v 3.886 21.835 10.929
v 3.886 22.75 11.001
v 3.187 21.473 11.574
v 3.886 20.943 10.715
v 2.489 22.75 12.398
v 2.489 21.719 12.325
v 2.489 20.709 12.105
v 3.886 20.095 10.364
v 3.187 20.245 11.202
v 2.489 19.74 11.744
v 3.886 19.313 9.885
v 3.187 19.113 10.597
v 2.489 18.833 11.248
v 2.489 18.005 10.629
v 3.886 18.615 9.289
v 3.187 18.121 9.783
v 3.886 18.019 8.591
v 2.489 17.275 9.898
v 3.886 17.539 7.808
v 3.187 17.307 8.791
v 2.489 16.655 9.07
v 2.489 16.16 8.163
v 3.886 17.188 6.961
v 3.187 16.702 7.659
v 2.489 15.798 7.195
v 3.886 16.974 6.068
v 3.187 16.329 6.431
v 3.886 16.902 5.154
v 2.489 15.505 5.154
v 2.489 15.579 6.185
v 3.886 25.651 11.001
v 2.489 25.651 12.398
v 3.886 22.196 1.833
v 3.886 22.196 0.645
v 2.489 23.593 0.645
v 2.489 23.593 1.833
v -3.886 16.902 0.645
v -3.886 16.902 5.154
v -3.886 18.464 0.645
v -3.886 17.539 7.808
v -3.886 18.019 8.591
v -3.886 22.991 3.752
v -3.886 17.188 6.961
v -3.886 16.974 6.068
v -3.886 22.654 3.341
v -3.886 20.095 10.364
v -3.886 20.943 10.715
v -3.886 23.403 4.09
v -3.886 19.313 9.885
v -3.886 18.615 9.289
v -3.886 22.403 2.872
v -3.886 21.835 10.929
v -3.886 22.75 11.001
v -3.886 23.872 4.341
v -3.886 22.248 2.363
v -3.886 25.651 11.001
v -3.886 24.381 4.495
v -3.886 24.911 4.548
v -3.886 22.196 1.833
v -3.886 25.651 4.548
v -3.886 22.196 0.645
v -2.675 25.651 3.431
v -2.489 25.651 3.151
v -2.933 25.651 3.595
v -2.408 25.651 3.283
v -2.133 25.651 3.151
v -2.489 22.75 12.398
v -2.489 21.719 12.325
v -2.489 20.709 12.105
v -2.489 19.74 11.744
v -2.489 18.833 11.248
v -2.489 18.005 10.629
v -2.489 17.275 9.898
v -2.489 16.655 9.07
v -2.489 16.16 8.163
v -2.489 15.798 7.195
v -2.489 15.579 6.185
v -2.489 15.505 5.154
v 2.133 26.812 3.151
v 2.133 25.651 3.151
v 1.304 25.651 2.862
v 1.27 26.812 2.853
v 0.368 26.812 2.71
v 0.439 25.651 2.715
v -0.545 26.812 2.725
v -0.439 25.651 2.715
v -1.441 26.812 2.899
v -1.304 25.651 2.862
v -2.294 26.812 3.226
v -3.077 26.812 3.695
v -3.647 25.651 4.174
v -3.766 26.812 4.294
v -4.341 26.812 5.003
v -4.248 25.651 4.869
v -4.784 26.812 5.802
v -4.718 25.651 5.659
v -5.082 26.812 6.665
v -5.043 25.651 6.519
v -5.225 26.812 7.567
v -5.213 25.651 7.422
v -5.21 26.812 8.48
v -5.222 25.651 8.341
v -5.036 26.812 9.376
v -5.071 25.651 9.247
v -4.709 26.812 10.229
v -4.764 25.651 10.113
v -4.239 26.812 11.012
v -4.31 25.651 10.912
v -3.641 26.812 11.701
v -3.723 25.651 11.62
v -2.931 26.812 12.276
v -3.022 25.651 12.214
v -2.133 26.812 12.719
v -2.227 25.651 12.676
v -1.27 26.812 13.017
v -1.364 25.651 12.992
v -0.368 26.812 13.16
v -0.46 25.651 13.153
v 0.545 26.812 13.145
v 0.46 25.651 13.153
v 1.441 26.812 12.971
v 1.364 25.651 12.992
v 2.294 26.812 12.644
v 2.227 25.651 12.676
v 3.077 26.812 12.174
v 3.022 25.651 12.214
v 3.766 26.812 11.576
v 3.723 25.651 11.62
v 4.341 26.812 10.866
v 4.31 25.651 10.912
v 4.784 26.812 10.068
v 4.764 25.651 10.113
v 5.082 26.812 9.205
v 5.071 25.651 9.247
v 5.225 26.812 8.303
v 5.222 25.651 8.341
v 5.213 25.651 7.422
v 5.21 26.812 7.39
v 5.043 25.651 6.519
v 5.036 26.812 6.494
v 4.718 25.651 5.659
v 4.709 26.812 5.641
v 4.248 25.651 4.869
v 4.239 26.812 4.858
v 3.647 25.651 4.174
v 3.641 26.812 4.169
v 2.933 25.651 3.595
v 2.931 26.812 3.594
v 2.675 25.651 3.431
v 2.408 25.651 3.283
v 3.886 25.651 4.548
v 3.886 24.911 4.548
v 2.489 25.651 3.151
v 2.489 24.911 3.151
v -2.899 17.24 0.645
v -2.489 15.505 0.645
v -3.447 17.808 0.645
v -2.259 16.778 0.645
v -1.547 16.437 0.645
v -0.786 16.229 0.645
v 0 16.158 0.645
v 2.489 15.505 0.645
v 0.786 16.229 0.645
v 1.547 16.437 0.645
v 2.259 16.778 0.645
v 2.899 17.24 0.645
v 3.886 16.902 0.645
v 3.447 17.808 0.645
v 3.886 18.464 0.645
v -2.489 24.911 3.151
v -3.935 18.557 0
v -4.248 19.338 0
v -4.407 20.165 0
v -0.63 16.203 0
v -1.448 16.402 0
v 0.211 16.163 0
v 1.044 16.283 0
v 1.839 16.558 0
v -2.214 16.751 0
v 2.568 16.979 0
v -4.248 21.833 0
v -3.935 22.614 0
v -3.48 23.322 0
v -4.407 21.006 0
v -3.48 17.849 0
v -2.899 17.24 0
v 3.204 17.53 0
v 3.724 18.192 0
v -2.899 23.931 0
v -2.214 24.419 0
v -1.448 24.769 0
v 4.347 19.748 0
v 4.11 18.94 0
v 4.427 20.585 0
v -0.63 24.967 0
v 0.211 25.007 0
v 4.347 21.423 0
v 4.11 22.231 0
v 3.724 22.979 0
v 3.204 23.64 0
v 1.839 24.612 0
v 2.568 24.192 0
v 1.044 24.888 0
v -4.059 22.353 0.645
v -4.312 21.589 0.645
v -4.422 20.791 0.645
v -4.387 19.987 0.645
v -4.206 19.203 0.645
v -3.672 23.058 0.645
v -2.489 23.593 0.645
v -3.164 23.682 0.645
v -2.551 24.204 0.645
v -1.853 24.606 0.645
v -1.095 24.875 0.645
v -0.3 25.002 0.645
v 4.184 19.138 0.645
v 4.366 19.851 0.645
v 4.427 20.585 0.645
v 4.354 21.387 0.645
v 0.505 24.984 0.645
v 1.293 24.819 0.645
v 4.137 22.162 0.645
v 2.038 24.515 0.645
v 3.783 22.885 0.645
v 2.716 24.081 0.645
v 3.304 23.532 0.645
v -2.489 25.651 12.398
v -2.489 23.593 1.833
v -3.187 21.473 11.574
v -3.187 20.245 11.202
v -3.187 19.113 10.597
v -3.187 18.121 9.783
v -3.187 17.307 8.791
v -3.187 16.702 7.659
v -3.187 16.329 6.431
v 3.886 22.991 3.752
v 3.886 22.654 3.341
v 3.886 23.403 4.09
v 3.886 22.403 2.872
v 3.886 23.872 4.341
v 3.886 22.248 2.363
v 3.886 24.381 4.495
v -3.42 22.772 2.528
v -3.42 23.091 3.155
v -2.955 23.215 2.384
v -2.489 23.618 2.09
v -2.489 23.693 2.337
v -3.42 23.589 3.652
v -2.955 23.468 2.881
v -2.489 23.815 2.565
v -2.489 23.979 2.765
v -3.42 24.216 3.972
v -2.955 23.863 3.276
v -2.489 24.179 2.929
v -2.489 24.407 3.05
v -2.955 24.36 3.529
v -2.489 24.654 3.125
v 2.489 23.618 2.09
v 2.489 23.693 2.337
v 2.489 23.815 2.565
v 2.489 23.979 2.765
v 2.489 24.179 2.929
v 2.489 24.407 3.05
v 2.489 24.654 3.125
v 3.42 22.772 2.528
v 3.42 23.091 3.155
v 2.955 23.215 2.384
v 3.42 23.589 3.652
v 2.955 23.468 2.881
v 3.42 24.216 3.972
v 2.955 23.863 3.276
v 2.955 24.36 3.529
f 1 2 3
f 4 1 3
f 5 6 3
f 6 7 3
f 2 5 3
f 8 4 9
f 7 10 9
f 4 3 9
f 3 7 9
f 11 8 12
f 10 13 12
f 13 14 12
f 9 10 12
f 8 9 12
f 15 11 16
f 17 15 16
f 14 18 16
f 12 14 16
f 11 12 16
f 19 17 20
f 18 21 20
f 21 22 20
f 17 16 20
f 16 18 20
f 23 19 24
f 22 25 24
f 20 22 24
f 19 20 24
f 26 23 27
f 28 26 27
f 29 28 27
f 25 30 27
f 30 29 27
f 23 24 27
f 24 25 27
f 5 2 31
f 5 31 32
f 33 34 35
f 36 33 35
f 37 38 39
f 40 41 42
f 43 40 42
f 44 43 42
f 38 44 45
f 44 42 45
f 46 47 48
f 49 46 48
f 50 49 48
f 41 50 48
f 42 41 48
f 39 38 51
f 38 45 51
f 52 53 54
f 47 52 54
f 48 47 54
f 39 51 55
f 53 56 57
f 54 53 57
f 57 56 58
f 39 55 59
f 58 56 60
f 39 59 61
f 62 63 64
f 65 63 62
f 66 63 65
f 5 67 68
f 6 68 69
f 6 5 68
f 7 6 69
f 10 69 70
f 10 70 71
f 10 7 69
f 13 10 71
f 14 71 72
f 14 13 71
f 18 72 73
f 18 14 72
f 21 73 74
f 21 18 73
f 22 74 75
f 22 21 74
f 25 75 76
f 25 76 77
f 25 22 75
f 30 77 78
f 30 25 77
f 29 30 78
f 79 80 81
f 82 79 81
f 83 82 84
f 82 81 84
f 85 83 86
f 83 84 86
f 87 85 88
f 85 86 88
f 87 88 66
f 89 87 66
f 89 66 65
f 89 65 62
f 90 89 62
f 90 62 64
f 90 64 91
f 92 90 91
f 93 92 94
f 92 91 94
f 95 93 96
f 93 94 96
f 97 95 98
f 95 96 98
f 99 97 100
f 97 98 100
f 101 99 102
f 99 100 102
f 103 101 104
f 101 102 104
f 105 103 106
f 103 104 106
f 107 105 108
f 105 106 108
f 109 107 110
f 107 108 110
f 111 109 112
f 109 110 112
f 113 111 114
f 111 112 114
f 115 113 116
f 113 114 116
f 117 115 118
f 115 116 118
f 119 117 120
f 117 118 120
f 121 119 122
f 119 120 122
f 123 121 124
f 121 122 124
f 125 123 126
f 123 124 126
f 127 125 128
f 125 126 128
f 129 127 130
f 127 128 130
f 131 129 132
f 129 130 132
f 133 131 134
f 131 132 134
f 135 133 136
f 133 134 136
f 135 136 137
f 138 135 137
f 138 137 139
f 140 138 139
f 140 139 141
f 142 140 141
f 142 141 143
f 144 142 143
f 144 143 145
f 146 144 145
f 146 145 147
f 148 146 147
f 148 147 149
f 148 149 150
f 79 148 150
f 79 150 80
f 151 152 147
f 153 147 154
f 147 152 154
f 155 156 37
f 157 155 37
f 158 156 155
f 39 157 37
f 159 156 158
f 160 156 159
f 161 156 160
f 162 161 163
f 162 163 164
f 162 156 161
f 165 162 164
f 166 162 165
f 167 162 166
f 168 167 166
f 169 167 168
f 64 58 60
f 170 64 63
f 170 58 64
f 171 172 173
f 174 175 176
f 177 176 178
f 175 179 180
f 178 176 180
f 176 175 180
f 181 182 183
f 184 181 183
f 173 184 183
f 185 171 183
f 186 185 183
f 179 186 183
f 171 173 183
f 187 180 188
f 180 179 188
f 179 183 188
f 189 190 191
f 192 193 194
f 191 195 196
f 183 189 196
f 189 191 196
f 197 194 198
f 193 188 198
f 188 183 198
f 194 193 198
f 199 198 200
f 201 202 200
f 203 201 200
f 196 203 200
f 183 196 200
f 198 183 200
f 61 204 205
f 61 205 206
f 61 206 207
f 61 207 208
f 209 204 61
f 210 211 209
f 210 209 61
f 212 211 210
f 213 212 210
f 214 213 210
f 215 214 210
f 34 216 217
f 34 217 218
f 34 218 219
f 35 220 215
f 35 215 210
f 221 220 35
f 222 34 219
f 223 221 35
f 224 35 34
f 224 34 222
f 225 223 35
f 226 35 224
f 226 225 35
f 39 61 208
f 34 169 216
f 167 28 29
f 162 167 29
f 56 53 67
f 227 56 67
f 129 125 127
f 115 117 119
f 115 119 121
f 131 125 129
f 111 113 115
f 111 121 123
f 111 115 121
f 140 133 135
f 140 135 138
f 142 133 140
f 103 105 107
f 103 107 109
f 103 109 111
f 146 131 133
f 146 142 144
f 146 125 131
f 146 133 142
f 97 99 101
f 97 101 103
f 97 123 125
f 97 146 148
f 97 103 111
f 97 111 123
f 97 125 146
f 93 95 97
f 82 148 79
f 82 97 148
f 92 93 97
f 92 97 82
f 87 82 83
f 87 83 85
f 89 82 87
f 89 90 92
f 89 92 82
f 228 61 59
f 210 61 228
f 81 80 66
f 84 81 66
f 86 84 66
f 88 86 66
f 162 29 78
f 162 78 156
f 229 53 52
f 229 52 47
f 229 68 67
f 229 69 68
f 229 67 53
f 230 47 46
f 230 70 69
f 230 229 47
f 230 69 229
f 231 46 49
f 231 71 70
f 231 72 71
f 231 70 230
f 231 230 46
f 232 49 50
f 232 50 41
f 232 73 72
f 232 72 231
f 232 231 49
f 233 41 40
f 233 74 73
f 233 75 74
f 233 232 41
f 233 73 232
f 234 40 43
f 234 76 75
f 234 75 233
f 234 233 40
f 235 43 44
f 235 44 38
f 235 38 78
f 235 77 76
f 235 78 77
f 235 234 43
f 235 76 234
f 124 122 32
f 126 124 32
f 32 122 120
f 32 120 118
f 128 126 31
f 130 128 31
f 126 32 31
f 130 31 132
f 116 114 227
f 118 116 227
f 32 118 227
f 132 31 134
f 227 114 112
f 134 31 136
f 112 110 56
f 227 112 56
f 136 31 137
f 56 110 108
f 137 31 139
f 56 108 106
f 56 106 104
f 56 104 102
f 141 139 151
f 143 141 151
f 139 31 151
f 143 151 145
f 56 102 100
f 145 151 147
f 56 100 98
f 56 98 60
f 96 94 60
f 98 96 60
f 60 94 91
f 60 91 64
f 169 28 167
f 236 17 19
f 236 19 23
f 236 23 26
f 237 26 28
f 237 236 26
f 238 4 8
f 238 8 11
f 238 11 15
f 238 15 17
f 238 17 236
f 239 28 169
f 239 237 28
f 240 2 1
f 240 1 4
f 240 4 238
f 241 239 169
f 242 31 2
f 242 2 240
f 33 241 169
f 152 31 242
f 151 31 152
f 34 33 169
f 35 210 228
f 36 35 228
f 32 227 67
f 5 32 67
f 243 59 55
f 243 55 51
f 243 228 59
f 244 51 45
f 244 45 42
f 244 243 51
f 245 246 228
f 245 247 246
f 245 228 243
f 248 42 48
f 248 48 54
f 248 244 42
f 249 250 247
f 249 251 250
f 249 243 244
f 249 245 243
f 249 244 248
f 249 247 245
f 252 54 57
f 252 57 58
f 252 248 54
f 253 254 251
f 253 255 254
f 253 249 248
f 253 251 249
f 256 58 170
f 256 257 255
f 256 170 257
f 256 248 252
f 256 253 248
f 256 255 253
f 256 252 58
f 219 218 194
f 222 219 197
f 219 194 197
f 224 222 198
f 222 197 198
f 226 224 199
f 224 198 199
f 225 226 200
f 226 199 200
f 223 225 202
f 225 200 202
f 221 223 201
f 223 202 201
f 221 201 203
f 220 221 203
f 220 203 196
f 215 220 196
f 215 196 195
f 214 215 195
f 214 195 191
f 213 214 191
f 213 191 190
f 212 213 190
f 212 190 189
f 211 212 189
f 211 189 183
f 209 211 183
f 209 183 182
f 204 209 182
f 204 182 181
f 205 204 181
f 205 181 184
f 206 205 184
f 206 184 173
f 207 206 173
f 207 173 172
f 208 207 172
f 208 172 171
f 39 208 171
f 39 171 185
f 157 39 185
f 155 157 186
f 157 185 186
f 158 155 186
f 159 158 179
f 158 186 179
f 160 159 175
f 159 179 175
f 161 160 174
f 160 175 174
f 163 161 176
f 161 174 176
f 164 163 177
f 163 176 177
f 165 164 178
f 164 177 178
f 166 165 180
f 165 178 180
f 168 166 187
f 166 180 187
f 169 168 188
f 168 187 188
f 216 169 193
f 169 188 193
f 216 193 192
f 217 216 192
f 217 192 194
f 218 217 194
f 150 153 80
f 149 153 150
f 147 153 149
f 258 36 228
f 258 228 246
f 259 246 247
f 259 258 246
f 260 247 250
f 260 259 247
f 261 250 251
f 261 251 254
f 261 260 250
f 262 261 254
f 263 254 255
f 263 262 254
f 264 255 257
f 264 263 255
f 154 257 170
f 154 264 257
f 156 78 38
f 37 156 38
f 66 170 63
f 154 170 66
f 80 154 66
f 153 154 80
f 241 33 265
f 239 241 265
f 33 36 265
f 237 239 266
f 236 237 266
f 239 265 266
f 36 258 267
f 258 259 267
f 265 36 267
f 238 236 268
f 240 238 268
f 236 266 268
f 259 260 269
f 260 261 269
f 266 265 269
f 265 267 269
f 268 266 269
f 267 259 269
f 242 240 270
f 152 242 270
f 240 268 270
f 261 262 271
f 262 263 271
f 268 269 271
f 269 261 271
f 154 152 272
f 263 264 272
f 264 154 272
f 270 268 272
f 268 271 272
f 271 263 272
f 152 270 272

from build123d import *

# Parameters (mm, degrees)
SKETCH1_R      = 4.427139884
EXTRUDE1_DEPTH = 0.644658235
EXTRUDE2_DEPTH = 3.885892792
SKETCH3_R      = 5.238234522
EXTRUDE3_DEPTH = 1.161266807
CHAMFER1_SIZE  = 1.397


with BuildPart() as part:
    # Sketch1 → Extrude1 (new body)
    with BuildSketch(Plane.XY):
        with Locations((0, 20.585351579)):
            Circle(SKETCH1_R)
    extrude(amount=EXTRUDE1_DEPTH)

    # Sketch2 → Extrude2 (add, symmetric)
    with BuildSketch(Plane(origin=(0, 0, 0), x_dir=(0, 0, -1), z_dir=(1, 0, 0))):
        with BuildLine():
            Line((-0.644658235, 15.505020105), (-0.644658235, 23.59311727))
            Line((-0.644658235, 23.59311727), (-1.832887116, 23.59311727))
            ThreePointArc((-1.832887116, 23.59311727), (-2.764654054, 23.979067772), (-3.150604557, 24.910834711))
            Line((-3.150604557, 24.910834711), (-3.150604557, 25.650777017))
            Line((-3.150604557, 25.650777017), (-12.398423576, 25.650777017))
            Line((-12.398423576, 25.650777017), (-12.398423576, 22.749820493))
            ThreePointArc((-12.398423576, 22.749820493), (-10.27647067, 17.62697301), (-5.153623188, 15.505020105))
            Line((-5.153623188, 15.505020105), (-0.644658235, 15.505020105))
        make_face()
    extrude(amount=EXTRUDE2_DEPTH, both=True)

    # Sketch3 → Extrude3 (add)
    with BuildSketch(Plane(origin=(0, 25.650777017, 0), x_dir=(1, 0, 0), z_dir=(0, 1, 0))):
        with Locations(Location((0, -7.934882504, 0), (0, 0, 65.970774096))):
            Circle(SKETCH3_R)
    extrude(amount=EXTRUDE3_DEPTH)

    # Chamfer1
    # the kernel refuses this chamfer: 1.397 mm, written as the material it takes off along each edge
    with BuildSketch(Plane(origin=(-3.885892792, 24.910834711, 1.832887116), x_dir=(0, -1, 0), z_dir=(0, 0, -1))) as chamfer1_piece_1:
        Polygon((1.317717441 + CHAMFER1_SIZE, 0), (1.317717441, -CHAMFER1_SIZE), (1.317717441, 0), align=None)
    revolve(axis=Axis((-3.885892792, 24.910834711, 1.832887116), (-1, 0, 0)), revolution_arc=90, mode=Mode.SUBTRACT)
    with BuildSketch(Plane(origin=(-3.885892792, 24.910834711, 3.150604557), x_dir=(-0.027495876610586344, 0, 0.9996219169112966), z_dir=(0, 1, 0))) as chamfer1_piece_2:
        Polygon((CHAMFER1_SIZE * 0.999621916911, CHAMFER1_SIZE * 0.0274958766106), (-CHAMFER1_SIZE * 0.0274958766106, CHAMFER1_SIZE * 0.999621916911), (0, 0), align=None)
    extrude(amount=0.739942306, mode=Mode.SUBTRACT)
    with BuildSketch(Plane(origin=(-3.885892792, 25.650777017, 12.398423576), x_dir=(-0.027495876610586365, 0, -0.9996219169112968), z_dir=(0, -1, 0))) as chamfer1_piece_3:
        Polygon((CHAMFER1_SIZE * 0.999621916911, CHAMFER1_SIZE * 0.0274958766106), (-CHAMFER1_SIZE * 0.0274958766106, CHAMFER1_SIZE * 0.999621916911), (0, 0), align=None)
    extrude(amount=2.900956524, mode=Mode.SUBTRACT)
    with BuildSketch(Plane(origin=(-3.885892792, 22.749820493, 5.153623188), x_dir=(0, 0, 1), z_dir=(0, 1, 0))) as chamfer1_piece_4:
        Polygon((7.244800387 - CHAMFER1_SIZE, 0), (7.244800387, CHAMFER1_SIZE), (7.244800387, 0), align=None)
    revolve(axis=Axis((-3.885892792, 22.749820493, 5.153623188), (1, 0, 0)), revolution_arc=90, mode=Mode.SUBTRACT)
    with BuildSketch(Plane(origin=(3.885892792, 15.505020105, 5.153623188), x_dir=(0.027495876610586393, 0.9996219169112966, 0), z_dir=(0, 0, -1)), Plane(origin=(-3.885892792, 15.505020105, 5.153623188), x_dir=(0.9996219169112968, -0.027495876610586046, 0), z_dir=(0, 0, -1))) as chamfer1_piece_5:
        Polygon((CHAMFER1_SIZE * 0.999621916911, -CHAMFER1_SIZE * 0.0274958766106), (-CHAMFER1_SIZE * 0.0274958766106, -CHAMFER1_SIZE * 0.999621916911), (0, 0), align=None)
    extrude(amount=8.101606087, mode=Mode.SUBTRACT)
    with BuildSketch(Plane(origin=(3.885892792, 23.59311727, 0.644658235), x_dir=(0.027495876610586393, -0.9996219169112966, 0), z_dir=(0, 0, 1))) as chamfer1_piece_6:
        Polygon((CHAMFER1_SIZE * 0.999621916911, -CHAMFER1_SIZE * 0.0274958766106), (-CHAMFER1_SIZE * 0.0274958766106, -CHAMFER1_SIZE * 0.999621916911), (0, 0), align=None)
    extrude(amount=1.188228881, mode=Mode.SUBTRACT)
    with BuildSketch(Plane(origin=(3.885892792, 24.910834711, 1.832887116), x_dir=(0, -1, 0), z_dir=(0, 0, -1))) as chamfer1_piece_7:
        Polygon((1.317717441 + CHAMFER1_SIZE, 0), (1.317717441, CHAMFER1_SIZE), (1.317717441, 0), align=None)
    revolve(axis=Axis((3.885892792, 24.910834711, 1.832887116), (-1, 0, 0)), revolution_arc=90, mode=Mode.SUBTRACT)
    with BuildSketch(Plane(origin=(3.885892792, 24.910834711, 3.150604557), x_dir=(0.027495876610586344, 0, 0.9996219169112966), z_dir=(0, 1, 0))) as chamfer1_piece_8:
        Polygon((CHAMFER1_SIZE * 0.999621916911, -CHAMFER1_SIZE * 0.0274958766106), (-CHAMFER1_SIZE * 0.0274958766106, -CHAMFER1_SIZE * 0.999621916911), (0, 0), align=None)
    extrude(amount=0.739942306, mode=Mode.SUBTRACT)
    with BuildSketch(Plane(origin=(3.885892792, 25.650777017, 12.398423576), x_dir=(0.027495876610586365, 0, -0.9996219169112968), z_dir=(0, -1, 0))) as chamfer1_piece_9:
        Polygon((CHAMFER1_SIZE * 0.999621916911, -CHAMFER1_SIZE * 0.0274958766106), (-CHAMFER1_SIZE * 0.0274958766106, -CHAMFER1_SIZE * 0.999621916911), (0, 0), align=None)
    extrude(amount=2.900956524, mode=Mode.SUBTRACT)
    with BuildSketch(Plane(origin=(3.885892792, 22.749820493, 5.153623188), x_dir=(0, 0, 1), z_dir=(0, 1, 0))) as chamfer1_piece_10:
        Polygon((7.244800387 - CHAMFER1_SIZE, 0), (7.244800387, -CHAMFER1_SIZE), (7.244800387, 0), align=None)
    revolve(axis=Axis((3.885892792, 22.749820493, 5.153623188), (1, 0, 0)), revolution_arc=90, mode=Mode.SUBTRACT)
    with BuildSketch(Plane(origin=(-3.885892792, 23.59311727, 0.644658235), x_dir=(-0.027495876610586393, -0.9996219169112966, 0), z_dir=(0, 0, 1))) as chamfer1_piece_11:
        Polygon((CHAMFER1_SIZE * 0.999621916911, CHAMFER1_SIZE * 0.0274958766106), (-CHAMFER1_SIZE * 0.0274958766106, CHAMFER1_SIZE * 0.999621916911), (0, 0), align=None)
    extrude(amount=1.188228881, mode=Mode.SUBTRACT)


solid = part.part
